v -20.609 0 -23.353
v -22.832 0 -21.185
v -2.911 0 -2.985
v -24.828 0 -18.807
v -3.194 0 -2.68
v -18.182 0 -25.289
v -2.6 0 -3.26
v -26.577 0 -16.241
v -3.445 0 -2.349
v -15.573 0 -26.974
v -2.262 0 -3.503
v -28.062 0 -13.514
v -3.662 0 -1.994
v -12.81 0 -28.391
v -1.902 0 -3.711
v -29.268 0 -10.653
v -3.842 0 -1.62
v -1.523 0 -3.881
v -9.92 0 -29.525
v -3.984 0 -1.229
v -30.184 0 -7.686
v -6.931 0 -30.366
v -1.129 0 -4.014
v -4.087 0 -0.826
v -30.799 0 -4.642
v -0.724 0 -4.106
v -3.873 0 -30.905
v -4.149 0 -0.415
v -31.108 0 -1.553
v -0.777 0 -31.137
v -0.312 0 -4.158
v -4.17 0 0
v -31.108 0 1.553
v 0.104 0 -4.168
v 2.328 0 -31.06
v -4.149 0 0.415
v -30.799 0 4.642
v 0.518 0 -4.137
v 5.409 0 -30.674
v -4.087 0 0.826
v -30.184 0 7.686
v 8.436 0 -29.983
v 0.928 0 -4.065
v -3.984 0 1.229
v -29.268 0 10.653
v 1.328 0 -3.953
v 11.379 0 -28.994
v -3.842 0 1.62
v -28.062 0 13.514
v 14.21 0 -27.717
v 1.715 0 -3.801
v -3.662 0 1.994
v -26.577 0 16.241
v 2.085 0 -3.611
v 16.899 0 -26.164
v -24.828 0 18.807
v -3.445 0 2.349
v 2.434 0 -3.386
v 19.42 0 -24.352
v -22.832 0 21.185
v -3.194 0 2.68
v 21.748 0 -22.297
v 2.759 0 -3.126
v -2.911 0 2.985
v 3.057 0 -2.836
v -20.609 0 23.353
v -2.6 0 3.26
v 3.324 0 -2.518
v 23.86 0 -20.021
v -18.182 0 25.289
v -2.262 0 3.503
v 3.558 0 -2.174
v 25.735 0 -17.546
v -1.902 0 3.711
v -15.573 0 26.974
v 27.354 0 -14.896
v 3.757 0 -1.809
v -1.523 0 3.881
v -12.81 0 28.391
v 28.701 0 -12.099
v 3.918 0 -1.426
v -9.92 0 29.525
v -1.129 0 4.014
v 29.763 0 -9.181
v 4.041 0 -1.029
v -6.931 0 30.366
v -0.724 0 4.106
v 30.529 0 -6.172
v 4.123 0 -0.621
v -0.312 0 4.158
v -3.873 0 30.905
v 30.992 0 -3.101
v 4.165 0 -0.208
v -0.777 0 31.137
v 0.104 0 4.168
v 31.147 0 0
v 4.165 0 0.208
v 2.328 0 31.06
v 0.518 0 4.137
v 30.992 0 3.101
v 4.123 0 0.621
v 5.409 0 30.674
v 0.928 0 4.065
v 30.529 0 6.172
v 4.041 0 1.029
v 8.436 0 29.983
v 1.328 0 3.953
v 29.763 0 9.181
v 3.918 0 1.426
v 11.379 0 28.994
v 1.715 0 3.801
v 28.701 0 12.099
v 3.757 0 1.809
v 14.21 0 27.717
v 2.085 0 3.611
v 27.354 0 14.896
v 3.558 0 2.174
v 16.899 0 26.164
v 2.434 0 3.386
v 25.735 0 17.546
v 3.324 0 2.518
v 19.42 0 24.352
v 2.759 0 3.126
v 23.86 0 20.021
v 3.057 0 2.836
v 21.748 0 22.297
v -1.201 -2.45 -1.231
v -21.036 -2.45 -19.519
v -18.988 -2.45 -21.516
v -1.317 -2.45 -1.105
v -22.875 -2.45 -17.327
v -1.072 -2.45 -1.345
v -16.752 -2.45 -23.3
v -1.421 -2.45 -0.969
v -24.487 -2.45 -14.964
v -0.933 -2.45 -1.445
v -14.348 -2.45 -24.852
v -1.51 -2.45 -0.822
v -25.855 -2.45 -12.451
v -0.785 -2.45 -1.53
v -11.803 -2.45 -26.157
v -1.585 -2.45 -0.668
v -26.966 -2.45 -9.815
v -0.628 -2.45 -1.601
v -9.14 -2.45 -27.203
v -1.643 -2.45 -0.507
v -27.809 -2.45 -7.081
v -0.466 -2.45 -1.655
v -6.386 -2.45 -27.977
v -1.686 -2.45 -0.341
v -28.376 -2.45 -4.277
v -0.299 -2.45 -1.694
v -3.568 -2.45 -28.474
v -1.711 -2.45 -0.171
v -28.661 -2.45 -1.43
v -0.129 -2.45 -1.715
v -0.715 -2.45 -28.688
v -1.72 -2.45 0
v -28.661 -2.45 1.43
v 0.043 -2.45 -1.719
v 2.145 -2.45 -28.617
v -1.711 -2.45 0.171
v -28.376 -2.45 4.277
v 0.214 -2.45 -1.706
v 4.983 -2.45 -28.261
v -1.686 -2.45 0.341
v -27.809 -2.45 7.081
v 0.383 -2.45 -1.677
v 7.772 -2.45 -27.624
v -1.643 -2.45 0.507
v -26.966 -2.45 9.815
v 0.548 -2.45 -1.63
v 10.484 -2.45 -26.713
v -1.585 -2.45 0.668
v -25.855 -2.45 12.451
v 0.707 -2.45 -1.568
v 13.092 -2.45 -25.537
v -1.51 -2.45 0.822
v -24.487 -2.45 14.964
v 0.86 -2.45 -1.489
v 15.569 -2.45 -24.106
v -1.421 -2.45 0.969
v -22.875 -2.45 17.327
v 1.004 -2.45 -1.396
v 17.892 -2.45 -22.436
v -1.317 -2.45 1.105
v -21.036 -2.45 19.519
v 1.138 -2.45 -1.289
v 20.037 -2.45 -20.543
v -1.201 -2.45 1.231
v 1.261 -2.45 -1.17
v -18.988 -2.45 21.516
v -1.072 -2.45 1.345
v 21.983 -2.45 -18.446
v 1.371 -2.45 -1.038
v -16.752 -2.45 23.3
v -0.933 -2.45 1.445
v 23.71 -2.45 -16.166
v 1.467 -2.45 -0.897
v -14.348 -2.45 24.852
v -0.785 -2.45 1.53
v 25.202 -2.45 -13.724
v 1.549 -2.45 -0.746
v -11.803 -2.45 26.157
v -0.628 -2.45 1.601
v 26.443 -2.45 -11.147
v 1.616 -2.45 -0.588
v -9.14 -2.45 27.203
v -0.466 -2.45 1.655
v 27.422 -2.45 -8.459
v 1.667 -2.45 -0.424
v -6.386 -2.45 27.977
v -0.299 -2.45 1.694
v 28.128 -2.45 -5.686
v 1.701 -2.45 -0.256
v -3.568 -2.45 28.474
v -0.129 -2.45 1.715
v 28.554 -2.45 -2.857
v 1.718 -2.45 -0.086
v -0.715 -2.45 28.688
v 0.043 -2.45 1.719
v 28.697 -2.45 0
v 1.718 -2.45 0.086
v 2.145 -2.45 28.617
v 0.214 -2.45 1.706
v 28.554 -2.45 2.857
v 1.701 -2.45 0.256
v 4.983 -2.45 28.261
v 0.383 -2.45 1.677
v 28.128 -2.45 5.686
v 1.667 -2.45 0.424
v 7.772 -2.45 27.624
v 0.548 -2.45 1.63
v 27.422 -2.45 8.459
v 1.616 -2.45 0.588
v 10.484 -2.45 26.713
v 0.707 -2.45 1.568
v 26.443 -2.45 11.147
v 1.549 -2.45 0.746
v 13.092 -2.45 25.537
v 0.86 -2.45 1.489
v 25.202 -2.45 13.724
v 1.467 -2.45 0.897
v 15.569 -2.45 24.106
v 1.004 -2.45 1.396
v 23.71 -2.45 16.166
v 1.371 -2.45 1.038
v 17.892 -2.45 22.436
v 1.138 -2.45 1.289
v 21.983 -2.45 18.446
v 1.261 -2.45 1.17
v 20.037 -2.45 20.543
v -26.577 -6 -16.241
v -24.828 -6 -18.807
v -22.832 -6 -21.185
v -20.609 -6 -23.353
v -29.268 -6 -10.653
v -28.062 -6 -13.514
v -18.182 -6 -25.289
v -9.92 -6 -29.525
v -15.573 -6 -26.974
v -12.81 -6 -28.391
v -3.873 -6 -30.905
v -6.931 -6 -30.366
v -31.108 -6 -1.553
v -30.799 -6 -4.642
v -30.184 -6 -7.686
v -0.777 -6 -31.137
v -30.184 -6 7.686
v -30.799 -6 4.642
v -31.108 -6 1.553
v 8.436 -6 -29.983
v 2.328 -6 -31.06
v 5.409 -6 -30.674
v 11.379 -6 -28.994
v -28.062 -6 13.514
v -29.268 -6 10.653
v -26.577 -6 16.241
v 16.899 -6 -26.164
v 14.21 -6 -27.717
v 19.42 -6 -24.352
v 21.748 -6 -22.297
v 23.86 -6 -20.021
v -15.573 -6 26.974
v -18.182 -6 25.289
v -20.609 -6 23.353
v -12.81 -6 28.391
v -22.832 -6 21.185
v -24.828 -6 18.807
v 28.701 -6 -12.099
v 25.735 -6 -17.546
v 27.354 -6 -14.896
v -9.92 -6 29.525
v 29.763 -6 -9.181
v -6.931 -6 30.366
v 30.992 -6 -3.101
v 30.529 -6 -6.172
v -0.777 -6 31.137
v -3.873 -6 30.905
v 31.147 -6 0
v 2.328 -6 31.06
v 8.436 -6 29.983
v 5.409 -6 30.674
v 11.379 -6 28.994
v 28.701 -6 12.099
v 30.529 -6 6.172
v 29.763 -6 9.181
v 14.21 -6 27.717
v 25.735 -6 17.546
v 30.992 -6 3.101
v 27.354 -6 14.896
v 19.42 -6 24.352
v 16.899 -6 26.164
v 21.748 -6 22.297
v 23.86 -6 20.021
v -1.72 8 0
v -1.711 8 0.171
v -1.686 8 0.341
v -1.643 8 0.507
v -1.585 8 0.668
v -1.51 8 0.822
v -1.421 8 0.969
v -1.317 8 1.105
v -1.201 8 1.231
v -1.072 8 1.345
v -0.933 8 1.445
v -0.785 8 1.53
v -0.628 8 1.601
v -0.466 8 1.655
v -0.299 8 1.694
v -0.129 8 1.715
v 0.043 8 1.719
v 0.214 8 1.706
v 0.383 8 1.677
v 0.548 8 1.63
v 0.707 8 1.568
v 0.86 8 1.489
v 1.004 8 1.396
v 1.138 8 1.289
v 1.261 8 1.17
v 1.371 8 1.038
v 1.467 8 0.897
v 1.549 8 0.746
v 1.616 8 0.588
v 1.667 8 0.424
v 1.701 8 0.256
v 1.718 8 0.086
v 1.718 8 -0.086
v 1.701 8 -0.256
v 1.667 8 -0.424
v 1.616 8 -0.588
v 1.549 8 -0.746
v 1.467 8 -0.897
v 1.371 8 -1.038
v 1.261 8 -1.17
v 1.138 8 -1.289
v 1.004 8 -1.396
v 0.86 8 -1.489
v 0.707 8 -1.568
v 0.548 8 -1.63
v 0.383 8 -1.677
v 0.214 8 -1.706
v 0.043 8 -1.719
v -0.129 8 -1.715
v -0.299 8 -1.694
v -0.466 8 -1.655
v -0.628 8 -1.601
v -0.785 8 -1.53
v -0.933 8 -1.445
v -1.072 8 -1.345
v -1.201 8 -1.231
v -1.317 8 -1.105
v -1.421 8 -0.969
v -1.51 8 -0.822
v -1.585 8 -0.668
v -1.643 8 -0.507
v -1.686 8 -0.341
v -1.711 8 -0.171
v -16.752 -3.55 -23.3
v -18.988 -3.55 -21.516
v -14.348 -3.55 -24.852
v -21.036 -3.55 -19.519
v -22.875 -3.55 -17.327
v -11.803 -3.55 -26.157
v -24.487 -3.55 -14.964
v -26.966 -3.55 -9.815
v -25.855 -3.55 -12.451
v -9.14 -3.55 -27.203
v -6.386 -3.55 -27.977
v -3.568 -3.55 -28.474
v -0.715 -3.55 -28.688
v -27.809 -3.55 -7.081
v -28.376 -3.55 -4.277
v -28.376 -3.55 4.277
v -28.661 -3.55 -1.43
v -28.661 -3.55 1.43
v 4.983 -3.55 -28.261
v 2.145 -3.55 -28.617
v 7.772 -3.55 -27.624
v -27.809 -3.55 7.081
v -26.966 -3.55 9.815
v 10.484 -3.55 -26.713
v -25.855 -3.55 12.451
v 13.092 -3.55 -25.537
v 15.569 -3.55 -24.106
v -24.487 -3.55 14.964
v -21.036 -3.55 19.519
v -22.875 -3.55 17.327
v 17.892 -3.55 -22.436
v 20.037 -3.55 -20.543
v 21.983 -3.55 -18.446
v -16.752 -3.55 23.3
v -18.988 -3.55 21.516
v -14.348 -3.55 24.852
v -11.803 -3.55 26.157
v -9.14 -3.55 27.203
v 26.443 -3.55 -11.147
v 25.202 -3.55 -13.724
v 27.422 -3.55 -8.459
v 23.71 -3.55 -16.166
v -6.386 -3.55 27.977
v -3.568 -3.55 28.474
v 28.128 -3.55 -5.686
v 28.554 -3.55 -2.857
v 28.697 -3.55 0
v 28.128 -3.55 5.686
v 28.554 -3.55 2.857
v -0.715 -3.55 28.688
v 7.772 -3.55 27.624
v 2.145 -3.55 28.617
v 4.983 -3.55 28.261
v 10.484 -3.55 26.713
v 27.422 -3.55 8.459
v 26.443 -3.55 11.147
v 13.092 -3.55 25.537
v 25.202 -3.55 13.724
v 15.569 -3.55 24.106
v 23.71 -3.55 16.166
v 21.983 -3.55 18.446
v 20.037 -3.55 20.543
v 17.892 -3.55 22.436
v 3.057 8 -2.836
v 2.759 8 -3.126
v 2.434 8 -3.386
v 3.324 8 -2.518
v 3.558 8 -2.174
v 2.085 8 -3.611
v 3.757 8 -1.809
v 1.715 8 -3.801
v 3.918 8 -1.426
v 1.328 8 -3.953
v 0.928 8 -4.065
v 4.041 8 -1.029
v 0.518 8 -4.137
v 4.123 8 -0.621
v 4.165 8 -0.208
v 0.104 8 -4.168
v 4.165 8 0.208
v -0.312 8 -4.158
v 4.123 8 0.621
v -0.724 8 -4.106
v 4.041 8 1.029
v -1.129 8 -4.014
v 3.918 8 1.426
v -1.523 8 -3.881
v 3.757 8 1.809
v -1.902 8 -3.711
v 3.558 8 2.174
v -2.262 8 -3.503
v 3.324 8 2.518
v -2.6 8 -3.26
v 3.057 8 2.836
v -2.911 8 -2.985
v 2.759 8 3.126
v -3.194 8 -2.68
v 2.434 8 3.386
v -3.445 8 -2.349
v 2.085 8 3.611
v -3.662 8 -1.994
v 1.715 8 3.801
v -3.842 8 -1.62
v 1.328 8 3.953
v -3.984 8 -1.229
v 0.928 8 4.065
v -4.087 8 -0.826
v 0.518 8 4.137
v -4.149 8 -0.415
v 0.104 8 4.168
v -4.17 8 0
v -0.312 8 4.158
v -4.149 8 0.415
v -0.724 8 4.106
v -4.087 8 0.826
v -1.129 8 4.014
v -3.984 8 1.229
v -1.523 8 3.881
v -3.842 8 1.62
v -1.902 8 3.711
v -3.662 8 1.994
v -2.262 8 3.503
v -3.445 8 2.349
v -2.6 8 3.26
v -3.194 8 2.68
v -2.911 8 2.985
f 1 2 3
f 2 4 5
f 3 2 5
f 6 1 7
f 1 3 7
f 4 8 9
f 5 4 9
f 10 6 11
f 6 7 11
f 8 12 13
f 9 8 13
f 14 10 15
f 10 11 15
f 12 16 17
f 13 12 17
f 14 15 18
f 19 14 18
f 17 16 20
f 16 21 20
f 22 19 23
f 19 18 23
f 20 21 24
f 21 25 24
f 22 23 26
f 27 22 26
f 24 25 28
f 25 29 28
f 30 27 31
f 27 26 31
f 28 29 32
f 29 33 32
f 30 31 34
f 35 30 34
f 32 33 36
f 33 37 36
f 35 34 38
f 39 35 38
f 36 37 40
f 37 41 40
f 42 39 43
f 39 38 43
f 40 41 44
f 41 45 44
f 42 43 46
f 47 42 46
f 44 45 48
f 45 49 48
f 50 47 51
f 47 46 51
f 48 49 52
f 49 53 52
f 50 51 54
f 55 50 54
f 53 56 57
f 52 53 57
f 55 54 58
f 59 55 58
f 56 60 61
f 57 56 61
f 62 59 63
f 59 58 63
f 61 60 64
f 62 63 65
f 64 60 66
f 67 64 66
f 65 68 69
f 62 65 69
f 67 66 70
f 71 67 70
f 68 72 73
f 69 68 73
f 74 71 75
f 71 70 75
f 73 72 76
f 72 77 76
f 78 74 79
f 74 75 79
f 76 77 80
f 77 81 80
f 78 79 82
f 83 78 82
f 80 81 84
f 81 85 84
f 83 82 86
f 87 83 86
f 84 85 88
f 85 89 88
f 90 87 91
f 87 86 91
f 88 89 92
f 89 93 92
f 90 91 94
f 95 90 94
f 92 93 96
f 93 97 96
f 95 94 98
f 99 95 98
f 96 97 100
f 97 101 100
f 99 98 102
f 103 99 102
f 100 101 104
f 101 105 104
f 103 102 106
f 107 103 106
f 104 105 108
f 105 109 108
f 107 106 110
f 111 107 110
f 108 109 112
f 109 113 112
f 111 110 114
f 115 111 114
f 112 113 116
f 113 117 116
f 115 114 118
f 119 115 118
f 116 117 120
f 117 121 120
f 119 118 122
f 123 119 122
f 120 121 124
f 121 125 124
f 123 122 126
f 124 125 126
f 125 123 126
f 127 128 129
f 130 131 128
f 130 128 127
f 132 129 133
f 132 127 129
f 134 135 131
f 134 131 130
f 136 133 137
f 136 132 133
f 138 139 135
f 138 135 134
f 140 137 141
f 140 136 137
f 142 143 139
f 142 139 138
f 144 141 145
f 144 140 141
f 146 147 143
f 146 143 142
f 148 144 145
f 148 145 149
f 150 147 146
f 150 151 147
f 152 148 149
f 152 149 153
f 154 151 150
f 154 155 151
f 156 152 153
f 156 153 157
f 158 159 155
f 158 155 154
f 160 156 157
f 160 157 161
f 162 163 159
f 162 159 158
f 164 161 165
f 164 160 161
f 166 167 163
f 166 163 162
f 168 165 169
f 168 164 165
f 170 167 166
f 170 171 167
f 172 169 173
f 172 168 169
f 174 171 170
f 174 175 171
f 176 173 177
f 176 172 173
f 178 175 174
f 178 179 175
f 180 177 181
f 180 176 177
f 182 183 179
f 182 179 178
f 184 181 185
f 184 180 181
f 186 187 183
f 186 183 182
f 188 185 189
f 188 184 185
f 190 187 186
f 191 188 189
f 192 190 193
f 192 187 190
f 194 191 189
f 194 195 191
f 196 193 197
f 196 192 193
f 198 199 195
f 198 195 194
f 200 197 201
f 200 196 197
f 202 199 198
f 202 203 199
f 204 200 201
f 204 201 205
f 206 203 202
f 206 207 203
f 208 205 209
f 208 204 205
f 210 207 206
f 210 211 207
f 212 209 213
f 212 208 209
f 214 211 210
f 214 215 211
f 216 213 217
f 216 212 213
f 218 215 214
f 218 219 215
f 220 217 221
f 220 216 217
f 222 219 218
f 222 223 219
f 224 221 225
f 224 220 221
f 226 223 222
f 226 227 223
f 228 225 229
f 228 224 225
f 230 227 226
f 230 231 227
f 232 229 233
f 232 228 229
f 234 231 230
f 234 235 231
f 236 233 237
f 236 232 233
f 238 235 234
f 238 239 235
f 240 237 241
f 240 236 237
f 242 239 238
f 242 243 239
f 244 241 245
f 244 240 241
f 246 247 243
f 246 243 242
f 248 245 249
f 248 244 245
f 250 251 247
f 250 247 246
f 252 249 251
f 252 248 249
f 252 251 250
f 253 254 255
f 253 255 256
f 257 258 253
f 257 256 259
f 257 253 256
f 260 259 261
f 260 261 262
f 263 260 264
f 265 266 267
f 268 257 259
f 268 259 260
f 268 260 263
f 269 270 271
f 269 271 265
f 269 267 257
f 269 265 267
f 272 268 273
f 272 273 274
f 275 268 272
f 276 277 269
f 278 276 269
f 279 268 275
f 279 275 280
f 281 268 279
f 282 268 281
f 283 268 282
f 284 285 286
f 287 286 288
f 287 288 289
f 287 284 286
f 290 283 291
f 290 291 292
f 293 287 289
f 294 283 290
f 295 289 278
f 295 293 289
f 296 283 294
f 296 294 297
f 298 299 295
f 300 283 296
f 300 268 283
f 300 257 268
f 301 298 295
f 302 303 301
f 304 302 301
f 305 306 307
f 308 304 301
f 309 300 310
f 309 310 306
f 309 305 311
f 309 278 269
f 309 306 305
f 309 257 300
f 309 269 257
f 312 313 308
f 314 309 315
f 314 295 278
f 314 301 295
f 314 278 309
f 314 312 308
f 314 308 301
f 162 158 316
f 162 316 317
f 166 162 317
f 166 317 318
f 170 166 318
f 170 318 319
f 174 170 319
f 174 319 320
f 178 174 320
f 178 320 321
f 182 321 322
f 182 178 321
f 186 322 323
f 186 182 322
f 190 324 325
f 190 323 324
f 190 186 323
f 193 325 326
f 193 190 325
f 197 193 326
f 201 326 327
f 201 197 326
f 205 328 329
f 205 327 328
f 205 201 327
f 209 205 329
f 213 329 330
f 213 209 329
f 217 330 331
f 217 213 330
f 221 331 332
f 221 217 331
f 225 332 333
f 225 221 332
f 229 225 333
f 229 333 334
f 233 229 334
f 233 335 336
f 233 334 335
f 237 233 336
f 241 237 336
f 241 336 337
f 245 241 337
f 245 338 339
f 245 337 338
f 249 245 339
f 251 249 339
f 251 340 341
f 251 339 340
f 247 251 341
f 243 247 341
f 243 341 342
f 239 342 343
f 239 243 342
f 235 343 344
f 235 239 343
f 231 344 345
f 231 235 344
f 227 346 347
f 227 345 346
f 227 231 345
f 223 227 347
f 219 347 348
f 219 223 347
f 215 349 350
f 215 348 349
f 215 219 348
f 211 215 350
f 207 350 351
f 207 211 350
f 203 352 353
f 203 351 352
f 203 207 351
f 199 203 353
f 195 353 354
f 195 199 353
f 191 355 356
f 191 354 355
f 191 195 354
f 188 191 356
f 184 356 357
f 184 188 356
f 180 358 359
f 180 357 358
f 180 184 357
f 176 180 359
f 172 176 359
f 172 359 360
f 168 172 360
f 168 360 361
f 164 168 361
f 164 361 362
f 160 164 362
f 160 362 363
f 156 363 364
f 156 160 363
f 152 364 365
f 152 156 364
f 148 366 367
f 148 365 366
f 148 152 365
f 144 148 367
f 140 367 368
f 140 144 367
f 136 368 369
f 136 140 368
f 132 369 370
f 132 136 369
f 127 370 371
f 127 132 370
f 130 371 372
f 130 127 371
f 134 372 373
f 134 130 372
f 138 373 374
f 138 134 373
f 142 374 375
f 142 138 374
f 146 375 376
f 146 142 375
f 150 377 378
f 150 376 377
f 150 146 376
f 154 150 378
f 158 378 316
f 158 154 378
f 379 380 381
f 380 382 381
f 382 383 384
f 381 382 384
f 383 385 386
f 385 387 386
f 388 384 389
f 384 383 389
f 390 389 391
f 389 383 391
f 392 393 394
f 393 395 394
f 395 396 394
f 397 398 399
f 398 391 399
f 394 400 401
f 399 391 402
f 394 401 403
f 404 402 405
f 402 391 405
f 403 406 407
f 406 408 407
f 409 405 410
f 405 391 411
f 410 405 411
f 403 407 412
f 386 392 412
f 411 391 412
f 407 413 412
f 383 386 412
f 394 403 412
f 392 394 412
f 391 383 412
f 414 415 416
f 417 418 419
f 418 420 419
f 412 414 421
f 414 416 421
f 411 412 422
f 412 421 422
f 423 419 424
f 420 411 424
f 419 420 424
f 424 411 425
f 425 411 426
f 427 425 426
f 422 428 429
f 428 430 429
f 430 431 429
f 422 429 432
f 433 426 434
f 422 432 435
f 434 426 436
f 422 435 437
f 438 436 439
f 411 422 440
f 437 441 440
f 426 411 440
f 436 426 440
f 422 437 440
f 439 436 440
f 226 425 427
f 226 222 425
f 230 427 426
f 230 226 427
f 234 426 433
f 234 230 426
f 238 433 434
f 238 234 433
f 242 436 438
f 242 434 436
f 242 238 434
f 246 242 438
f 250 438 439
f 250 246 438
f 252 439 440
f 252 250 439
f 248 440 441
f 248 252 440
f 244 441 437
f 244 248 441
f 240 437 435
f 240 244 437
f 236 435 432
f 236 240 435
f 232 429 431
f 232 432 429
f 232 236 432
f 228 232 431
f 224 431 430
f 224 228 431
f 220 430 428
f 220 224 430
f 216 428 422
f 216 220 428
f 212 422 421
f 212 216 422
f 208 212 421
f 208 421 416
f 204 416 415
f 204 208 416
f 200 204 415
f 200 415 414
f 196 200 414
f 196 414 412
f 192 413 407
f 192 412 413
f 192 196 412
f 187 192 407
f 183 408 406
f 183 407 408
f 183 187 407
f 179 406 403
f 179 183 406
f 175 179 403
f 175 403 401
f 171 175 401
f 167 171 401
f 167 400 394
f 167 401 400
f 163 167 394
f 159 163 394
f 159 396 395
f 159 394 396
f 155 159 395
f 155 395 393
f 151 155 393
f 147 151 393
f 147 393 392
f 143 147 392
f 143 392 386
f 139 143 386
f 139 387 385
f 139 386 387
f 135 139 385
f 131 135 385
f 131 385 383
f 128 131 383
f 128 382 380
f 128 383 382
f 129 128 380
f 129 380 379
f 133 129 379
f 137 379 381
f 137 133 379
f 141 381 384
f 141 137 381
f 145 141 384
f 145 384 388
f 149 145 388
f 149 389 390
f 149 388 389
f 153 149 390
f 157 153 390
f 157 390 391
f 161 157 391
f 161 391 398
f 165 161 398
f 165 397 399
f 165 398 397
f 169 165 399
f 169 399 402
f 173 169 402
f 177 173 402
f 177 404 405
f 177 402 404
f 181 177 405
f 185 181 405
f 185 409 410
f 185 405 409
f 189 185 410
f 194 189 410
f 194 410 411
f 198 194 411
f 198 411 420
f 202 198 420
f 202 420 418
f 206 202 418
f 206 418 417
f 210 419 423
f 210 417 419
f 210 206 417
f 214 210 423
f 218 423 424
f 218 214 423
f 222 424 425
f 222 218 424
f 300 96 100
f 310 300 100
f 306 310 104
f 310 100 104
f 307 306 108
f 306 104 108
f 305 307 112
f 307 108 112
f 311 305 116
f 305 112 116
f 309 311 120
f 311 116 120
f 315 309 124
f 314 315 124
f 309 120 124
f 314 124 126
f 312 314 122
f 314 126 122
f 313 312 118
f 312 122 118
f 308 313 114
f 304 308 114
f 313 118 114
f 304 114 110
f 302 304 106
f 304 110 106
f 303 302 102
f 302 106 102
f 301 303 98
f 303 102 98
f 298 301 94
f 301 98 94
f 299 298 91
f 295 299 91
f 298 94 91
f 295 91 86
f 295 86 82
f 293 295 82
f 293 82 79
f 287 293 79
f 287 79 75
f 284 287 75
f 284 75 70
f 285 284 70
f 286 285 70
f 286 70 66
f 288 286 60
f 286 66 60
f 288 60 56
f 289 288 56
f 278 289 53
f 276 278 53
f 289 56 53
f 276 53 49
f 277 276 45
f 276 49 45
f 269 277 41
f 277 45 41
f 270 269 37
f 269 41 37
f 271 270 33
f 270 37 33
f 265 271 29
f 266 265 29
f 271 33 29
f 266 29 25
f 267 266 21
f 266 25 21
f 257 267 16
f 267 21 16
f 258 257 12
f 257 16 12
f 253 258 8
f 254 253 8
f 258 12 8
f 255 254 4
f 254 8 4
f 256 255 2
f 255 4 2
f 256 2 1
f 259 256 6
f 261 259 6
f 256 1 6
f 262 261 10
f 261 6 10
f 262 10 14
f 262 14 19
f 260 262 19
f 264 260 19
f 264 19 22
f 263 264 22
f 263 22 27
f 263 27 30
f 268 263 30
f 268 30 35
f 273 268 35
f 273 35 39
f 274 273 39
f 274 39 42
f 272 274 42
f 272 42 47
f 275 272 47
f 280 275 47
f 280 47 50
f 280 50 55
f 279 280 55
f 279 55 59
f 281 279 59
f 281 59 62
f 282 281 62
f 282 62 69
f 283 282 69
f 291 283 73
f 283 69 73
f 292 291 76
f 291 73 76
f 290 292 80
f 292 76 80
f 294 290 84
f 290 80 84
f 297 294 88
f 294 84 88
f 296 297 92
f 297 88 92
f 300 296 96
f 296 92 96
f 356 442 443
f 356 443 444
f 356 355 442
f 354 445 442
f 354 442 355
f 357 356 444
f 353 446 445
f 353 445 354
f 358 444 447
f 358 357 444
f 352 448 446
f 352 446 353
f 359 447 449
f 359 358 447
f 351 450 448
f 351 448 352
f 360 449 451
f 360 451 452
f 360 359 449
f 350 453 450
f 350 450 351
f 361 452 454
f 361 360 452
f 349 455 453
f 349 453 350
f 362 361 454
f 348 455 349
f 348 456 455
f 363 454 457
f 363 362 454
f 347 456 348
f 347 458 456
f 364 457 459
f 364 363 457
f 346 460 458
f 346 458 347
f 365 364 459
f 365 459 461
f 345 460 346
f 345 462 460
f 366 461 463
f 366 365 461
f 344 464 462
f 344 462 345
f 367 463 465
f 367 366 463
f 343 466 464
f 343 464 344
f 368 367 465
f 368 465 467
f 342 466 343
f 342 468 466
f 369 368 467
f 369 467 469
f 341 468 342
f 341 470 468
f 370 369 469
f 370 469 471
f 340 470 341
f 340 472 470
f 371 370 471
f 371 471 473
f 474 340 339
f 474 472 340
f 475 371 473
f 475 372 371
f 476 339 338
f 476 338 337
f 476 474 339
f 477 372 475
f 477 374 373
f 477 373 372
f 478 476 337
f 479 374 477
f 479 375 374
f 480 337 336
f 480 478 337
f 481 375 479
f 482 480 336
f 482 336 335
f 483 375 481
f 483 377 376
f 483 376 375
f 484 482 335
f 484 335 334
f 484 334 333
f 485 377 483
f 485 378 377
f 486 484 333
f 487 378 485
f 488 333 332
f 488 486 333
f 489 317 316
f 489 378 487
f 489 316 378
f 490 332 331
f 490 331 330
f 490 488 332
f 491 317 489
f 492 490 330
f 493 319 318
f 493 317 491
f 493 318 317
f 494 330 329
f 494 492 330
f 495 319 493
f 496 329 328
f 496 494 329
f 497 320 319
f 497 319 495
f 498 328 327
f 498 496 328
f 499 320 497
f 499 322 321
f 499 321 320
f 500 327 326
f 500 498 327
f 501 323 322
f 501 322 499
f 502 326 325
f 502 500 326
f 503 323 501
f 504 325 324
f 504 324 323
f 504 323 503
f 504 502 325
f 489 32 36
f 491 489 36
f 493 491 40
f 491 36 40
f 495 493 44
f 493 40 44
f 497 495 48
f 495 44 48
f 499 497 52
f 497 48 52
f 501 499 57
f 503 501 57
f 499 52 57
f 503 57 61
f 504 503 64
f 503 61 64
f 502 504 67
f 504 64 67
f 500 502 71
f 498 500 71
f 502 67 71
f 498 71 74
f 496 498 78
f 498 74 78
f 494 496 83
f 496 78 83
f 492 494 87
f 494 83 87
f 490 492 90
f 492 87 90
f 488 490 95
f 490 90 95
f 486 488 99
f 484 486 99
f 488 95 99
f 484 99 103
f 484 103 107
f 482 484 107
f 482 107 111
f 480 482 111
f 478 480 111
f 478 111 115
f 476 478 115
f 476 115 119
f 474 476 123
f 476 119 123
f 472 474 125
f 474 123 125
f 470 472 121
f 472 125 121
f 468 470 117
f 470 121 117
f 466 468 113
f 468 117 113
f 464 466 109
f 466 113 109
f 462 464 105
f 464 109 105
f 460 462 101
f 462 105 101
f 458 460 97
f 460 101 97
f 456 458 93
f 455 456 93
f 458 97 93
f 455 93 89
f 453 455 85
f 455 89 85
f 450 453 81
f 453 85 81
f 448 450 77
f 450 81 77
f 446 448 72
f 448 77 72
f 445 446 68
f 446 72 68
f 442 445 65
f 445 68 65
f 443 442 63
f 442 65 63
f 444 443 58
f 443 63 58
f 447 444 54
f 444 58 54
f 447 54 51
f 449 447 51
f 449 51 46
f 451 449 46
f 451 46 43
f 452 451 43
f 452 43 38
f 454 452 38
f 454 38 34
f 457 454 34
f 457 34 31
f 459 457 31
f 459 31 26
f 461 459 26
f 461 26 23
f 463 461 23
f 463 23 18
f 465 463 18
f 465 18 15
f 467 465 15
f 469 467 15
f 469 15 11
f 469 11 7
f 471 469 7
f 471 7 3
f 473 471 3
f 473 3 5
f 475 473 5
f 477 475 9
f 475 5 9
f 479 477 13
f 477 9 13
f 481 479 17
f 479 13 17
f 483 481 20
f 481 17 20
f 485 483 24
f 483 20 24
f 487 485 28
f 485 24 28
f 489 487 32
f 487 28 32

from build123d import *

# Parameters (mm, degrees)
F0_R     = 31.146875323
F1_DEPTH = 6
F2_R     = 4.1697172025
F3_DEPTH = 8
F4_T     = -2.45


with BuildPart() as f1:
    # F0 (on Front) → F1 (new body)
    with BuildSketch(Plane.XZ):
        Circle(F0_R)
    extrude(amount=F1_DEPTH)

    # F2 (on face) → F3 (join)
    with BuildSketch(Plane(origin=(0, 0, 0), x_dir=(-1, 0, 0), z_dir=(0, 1, 0))):
        Circle(F2_R)
    extrude(amount=F3_DEPTH)

    # F4
    f4_openings = [f1.faces().sort_by_distance(p)[0] for p in [
        (0, 8, 0),
    ]]
    offset(amount=F4_T, openings=f4_openings, kind=Kind.INTERSECTION)


solid = f1.part
